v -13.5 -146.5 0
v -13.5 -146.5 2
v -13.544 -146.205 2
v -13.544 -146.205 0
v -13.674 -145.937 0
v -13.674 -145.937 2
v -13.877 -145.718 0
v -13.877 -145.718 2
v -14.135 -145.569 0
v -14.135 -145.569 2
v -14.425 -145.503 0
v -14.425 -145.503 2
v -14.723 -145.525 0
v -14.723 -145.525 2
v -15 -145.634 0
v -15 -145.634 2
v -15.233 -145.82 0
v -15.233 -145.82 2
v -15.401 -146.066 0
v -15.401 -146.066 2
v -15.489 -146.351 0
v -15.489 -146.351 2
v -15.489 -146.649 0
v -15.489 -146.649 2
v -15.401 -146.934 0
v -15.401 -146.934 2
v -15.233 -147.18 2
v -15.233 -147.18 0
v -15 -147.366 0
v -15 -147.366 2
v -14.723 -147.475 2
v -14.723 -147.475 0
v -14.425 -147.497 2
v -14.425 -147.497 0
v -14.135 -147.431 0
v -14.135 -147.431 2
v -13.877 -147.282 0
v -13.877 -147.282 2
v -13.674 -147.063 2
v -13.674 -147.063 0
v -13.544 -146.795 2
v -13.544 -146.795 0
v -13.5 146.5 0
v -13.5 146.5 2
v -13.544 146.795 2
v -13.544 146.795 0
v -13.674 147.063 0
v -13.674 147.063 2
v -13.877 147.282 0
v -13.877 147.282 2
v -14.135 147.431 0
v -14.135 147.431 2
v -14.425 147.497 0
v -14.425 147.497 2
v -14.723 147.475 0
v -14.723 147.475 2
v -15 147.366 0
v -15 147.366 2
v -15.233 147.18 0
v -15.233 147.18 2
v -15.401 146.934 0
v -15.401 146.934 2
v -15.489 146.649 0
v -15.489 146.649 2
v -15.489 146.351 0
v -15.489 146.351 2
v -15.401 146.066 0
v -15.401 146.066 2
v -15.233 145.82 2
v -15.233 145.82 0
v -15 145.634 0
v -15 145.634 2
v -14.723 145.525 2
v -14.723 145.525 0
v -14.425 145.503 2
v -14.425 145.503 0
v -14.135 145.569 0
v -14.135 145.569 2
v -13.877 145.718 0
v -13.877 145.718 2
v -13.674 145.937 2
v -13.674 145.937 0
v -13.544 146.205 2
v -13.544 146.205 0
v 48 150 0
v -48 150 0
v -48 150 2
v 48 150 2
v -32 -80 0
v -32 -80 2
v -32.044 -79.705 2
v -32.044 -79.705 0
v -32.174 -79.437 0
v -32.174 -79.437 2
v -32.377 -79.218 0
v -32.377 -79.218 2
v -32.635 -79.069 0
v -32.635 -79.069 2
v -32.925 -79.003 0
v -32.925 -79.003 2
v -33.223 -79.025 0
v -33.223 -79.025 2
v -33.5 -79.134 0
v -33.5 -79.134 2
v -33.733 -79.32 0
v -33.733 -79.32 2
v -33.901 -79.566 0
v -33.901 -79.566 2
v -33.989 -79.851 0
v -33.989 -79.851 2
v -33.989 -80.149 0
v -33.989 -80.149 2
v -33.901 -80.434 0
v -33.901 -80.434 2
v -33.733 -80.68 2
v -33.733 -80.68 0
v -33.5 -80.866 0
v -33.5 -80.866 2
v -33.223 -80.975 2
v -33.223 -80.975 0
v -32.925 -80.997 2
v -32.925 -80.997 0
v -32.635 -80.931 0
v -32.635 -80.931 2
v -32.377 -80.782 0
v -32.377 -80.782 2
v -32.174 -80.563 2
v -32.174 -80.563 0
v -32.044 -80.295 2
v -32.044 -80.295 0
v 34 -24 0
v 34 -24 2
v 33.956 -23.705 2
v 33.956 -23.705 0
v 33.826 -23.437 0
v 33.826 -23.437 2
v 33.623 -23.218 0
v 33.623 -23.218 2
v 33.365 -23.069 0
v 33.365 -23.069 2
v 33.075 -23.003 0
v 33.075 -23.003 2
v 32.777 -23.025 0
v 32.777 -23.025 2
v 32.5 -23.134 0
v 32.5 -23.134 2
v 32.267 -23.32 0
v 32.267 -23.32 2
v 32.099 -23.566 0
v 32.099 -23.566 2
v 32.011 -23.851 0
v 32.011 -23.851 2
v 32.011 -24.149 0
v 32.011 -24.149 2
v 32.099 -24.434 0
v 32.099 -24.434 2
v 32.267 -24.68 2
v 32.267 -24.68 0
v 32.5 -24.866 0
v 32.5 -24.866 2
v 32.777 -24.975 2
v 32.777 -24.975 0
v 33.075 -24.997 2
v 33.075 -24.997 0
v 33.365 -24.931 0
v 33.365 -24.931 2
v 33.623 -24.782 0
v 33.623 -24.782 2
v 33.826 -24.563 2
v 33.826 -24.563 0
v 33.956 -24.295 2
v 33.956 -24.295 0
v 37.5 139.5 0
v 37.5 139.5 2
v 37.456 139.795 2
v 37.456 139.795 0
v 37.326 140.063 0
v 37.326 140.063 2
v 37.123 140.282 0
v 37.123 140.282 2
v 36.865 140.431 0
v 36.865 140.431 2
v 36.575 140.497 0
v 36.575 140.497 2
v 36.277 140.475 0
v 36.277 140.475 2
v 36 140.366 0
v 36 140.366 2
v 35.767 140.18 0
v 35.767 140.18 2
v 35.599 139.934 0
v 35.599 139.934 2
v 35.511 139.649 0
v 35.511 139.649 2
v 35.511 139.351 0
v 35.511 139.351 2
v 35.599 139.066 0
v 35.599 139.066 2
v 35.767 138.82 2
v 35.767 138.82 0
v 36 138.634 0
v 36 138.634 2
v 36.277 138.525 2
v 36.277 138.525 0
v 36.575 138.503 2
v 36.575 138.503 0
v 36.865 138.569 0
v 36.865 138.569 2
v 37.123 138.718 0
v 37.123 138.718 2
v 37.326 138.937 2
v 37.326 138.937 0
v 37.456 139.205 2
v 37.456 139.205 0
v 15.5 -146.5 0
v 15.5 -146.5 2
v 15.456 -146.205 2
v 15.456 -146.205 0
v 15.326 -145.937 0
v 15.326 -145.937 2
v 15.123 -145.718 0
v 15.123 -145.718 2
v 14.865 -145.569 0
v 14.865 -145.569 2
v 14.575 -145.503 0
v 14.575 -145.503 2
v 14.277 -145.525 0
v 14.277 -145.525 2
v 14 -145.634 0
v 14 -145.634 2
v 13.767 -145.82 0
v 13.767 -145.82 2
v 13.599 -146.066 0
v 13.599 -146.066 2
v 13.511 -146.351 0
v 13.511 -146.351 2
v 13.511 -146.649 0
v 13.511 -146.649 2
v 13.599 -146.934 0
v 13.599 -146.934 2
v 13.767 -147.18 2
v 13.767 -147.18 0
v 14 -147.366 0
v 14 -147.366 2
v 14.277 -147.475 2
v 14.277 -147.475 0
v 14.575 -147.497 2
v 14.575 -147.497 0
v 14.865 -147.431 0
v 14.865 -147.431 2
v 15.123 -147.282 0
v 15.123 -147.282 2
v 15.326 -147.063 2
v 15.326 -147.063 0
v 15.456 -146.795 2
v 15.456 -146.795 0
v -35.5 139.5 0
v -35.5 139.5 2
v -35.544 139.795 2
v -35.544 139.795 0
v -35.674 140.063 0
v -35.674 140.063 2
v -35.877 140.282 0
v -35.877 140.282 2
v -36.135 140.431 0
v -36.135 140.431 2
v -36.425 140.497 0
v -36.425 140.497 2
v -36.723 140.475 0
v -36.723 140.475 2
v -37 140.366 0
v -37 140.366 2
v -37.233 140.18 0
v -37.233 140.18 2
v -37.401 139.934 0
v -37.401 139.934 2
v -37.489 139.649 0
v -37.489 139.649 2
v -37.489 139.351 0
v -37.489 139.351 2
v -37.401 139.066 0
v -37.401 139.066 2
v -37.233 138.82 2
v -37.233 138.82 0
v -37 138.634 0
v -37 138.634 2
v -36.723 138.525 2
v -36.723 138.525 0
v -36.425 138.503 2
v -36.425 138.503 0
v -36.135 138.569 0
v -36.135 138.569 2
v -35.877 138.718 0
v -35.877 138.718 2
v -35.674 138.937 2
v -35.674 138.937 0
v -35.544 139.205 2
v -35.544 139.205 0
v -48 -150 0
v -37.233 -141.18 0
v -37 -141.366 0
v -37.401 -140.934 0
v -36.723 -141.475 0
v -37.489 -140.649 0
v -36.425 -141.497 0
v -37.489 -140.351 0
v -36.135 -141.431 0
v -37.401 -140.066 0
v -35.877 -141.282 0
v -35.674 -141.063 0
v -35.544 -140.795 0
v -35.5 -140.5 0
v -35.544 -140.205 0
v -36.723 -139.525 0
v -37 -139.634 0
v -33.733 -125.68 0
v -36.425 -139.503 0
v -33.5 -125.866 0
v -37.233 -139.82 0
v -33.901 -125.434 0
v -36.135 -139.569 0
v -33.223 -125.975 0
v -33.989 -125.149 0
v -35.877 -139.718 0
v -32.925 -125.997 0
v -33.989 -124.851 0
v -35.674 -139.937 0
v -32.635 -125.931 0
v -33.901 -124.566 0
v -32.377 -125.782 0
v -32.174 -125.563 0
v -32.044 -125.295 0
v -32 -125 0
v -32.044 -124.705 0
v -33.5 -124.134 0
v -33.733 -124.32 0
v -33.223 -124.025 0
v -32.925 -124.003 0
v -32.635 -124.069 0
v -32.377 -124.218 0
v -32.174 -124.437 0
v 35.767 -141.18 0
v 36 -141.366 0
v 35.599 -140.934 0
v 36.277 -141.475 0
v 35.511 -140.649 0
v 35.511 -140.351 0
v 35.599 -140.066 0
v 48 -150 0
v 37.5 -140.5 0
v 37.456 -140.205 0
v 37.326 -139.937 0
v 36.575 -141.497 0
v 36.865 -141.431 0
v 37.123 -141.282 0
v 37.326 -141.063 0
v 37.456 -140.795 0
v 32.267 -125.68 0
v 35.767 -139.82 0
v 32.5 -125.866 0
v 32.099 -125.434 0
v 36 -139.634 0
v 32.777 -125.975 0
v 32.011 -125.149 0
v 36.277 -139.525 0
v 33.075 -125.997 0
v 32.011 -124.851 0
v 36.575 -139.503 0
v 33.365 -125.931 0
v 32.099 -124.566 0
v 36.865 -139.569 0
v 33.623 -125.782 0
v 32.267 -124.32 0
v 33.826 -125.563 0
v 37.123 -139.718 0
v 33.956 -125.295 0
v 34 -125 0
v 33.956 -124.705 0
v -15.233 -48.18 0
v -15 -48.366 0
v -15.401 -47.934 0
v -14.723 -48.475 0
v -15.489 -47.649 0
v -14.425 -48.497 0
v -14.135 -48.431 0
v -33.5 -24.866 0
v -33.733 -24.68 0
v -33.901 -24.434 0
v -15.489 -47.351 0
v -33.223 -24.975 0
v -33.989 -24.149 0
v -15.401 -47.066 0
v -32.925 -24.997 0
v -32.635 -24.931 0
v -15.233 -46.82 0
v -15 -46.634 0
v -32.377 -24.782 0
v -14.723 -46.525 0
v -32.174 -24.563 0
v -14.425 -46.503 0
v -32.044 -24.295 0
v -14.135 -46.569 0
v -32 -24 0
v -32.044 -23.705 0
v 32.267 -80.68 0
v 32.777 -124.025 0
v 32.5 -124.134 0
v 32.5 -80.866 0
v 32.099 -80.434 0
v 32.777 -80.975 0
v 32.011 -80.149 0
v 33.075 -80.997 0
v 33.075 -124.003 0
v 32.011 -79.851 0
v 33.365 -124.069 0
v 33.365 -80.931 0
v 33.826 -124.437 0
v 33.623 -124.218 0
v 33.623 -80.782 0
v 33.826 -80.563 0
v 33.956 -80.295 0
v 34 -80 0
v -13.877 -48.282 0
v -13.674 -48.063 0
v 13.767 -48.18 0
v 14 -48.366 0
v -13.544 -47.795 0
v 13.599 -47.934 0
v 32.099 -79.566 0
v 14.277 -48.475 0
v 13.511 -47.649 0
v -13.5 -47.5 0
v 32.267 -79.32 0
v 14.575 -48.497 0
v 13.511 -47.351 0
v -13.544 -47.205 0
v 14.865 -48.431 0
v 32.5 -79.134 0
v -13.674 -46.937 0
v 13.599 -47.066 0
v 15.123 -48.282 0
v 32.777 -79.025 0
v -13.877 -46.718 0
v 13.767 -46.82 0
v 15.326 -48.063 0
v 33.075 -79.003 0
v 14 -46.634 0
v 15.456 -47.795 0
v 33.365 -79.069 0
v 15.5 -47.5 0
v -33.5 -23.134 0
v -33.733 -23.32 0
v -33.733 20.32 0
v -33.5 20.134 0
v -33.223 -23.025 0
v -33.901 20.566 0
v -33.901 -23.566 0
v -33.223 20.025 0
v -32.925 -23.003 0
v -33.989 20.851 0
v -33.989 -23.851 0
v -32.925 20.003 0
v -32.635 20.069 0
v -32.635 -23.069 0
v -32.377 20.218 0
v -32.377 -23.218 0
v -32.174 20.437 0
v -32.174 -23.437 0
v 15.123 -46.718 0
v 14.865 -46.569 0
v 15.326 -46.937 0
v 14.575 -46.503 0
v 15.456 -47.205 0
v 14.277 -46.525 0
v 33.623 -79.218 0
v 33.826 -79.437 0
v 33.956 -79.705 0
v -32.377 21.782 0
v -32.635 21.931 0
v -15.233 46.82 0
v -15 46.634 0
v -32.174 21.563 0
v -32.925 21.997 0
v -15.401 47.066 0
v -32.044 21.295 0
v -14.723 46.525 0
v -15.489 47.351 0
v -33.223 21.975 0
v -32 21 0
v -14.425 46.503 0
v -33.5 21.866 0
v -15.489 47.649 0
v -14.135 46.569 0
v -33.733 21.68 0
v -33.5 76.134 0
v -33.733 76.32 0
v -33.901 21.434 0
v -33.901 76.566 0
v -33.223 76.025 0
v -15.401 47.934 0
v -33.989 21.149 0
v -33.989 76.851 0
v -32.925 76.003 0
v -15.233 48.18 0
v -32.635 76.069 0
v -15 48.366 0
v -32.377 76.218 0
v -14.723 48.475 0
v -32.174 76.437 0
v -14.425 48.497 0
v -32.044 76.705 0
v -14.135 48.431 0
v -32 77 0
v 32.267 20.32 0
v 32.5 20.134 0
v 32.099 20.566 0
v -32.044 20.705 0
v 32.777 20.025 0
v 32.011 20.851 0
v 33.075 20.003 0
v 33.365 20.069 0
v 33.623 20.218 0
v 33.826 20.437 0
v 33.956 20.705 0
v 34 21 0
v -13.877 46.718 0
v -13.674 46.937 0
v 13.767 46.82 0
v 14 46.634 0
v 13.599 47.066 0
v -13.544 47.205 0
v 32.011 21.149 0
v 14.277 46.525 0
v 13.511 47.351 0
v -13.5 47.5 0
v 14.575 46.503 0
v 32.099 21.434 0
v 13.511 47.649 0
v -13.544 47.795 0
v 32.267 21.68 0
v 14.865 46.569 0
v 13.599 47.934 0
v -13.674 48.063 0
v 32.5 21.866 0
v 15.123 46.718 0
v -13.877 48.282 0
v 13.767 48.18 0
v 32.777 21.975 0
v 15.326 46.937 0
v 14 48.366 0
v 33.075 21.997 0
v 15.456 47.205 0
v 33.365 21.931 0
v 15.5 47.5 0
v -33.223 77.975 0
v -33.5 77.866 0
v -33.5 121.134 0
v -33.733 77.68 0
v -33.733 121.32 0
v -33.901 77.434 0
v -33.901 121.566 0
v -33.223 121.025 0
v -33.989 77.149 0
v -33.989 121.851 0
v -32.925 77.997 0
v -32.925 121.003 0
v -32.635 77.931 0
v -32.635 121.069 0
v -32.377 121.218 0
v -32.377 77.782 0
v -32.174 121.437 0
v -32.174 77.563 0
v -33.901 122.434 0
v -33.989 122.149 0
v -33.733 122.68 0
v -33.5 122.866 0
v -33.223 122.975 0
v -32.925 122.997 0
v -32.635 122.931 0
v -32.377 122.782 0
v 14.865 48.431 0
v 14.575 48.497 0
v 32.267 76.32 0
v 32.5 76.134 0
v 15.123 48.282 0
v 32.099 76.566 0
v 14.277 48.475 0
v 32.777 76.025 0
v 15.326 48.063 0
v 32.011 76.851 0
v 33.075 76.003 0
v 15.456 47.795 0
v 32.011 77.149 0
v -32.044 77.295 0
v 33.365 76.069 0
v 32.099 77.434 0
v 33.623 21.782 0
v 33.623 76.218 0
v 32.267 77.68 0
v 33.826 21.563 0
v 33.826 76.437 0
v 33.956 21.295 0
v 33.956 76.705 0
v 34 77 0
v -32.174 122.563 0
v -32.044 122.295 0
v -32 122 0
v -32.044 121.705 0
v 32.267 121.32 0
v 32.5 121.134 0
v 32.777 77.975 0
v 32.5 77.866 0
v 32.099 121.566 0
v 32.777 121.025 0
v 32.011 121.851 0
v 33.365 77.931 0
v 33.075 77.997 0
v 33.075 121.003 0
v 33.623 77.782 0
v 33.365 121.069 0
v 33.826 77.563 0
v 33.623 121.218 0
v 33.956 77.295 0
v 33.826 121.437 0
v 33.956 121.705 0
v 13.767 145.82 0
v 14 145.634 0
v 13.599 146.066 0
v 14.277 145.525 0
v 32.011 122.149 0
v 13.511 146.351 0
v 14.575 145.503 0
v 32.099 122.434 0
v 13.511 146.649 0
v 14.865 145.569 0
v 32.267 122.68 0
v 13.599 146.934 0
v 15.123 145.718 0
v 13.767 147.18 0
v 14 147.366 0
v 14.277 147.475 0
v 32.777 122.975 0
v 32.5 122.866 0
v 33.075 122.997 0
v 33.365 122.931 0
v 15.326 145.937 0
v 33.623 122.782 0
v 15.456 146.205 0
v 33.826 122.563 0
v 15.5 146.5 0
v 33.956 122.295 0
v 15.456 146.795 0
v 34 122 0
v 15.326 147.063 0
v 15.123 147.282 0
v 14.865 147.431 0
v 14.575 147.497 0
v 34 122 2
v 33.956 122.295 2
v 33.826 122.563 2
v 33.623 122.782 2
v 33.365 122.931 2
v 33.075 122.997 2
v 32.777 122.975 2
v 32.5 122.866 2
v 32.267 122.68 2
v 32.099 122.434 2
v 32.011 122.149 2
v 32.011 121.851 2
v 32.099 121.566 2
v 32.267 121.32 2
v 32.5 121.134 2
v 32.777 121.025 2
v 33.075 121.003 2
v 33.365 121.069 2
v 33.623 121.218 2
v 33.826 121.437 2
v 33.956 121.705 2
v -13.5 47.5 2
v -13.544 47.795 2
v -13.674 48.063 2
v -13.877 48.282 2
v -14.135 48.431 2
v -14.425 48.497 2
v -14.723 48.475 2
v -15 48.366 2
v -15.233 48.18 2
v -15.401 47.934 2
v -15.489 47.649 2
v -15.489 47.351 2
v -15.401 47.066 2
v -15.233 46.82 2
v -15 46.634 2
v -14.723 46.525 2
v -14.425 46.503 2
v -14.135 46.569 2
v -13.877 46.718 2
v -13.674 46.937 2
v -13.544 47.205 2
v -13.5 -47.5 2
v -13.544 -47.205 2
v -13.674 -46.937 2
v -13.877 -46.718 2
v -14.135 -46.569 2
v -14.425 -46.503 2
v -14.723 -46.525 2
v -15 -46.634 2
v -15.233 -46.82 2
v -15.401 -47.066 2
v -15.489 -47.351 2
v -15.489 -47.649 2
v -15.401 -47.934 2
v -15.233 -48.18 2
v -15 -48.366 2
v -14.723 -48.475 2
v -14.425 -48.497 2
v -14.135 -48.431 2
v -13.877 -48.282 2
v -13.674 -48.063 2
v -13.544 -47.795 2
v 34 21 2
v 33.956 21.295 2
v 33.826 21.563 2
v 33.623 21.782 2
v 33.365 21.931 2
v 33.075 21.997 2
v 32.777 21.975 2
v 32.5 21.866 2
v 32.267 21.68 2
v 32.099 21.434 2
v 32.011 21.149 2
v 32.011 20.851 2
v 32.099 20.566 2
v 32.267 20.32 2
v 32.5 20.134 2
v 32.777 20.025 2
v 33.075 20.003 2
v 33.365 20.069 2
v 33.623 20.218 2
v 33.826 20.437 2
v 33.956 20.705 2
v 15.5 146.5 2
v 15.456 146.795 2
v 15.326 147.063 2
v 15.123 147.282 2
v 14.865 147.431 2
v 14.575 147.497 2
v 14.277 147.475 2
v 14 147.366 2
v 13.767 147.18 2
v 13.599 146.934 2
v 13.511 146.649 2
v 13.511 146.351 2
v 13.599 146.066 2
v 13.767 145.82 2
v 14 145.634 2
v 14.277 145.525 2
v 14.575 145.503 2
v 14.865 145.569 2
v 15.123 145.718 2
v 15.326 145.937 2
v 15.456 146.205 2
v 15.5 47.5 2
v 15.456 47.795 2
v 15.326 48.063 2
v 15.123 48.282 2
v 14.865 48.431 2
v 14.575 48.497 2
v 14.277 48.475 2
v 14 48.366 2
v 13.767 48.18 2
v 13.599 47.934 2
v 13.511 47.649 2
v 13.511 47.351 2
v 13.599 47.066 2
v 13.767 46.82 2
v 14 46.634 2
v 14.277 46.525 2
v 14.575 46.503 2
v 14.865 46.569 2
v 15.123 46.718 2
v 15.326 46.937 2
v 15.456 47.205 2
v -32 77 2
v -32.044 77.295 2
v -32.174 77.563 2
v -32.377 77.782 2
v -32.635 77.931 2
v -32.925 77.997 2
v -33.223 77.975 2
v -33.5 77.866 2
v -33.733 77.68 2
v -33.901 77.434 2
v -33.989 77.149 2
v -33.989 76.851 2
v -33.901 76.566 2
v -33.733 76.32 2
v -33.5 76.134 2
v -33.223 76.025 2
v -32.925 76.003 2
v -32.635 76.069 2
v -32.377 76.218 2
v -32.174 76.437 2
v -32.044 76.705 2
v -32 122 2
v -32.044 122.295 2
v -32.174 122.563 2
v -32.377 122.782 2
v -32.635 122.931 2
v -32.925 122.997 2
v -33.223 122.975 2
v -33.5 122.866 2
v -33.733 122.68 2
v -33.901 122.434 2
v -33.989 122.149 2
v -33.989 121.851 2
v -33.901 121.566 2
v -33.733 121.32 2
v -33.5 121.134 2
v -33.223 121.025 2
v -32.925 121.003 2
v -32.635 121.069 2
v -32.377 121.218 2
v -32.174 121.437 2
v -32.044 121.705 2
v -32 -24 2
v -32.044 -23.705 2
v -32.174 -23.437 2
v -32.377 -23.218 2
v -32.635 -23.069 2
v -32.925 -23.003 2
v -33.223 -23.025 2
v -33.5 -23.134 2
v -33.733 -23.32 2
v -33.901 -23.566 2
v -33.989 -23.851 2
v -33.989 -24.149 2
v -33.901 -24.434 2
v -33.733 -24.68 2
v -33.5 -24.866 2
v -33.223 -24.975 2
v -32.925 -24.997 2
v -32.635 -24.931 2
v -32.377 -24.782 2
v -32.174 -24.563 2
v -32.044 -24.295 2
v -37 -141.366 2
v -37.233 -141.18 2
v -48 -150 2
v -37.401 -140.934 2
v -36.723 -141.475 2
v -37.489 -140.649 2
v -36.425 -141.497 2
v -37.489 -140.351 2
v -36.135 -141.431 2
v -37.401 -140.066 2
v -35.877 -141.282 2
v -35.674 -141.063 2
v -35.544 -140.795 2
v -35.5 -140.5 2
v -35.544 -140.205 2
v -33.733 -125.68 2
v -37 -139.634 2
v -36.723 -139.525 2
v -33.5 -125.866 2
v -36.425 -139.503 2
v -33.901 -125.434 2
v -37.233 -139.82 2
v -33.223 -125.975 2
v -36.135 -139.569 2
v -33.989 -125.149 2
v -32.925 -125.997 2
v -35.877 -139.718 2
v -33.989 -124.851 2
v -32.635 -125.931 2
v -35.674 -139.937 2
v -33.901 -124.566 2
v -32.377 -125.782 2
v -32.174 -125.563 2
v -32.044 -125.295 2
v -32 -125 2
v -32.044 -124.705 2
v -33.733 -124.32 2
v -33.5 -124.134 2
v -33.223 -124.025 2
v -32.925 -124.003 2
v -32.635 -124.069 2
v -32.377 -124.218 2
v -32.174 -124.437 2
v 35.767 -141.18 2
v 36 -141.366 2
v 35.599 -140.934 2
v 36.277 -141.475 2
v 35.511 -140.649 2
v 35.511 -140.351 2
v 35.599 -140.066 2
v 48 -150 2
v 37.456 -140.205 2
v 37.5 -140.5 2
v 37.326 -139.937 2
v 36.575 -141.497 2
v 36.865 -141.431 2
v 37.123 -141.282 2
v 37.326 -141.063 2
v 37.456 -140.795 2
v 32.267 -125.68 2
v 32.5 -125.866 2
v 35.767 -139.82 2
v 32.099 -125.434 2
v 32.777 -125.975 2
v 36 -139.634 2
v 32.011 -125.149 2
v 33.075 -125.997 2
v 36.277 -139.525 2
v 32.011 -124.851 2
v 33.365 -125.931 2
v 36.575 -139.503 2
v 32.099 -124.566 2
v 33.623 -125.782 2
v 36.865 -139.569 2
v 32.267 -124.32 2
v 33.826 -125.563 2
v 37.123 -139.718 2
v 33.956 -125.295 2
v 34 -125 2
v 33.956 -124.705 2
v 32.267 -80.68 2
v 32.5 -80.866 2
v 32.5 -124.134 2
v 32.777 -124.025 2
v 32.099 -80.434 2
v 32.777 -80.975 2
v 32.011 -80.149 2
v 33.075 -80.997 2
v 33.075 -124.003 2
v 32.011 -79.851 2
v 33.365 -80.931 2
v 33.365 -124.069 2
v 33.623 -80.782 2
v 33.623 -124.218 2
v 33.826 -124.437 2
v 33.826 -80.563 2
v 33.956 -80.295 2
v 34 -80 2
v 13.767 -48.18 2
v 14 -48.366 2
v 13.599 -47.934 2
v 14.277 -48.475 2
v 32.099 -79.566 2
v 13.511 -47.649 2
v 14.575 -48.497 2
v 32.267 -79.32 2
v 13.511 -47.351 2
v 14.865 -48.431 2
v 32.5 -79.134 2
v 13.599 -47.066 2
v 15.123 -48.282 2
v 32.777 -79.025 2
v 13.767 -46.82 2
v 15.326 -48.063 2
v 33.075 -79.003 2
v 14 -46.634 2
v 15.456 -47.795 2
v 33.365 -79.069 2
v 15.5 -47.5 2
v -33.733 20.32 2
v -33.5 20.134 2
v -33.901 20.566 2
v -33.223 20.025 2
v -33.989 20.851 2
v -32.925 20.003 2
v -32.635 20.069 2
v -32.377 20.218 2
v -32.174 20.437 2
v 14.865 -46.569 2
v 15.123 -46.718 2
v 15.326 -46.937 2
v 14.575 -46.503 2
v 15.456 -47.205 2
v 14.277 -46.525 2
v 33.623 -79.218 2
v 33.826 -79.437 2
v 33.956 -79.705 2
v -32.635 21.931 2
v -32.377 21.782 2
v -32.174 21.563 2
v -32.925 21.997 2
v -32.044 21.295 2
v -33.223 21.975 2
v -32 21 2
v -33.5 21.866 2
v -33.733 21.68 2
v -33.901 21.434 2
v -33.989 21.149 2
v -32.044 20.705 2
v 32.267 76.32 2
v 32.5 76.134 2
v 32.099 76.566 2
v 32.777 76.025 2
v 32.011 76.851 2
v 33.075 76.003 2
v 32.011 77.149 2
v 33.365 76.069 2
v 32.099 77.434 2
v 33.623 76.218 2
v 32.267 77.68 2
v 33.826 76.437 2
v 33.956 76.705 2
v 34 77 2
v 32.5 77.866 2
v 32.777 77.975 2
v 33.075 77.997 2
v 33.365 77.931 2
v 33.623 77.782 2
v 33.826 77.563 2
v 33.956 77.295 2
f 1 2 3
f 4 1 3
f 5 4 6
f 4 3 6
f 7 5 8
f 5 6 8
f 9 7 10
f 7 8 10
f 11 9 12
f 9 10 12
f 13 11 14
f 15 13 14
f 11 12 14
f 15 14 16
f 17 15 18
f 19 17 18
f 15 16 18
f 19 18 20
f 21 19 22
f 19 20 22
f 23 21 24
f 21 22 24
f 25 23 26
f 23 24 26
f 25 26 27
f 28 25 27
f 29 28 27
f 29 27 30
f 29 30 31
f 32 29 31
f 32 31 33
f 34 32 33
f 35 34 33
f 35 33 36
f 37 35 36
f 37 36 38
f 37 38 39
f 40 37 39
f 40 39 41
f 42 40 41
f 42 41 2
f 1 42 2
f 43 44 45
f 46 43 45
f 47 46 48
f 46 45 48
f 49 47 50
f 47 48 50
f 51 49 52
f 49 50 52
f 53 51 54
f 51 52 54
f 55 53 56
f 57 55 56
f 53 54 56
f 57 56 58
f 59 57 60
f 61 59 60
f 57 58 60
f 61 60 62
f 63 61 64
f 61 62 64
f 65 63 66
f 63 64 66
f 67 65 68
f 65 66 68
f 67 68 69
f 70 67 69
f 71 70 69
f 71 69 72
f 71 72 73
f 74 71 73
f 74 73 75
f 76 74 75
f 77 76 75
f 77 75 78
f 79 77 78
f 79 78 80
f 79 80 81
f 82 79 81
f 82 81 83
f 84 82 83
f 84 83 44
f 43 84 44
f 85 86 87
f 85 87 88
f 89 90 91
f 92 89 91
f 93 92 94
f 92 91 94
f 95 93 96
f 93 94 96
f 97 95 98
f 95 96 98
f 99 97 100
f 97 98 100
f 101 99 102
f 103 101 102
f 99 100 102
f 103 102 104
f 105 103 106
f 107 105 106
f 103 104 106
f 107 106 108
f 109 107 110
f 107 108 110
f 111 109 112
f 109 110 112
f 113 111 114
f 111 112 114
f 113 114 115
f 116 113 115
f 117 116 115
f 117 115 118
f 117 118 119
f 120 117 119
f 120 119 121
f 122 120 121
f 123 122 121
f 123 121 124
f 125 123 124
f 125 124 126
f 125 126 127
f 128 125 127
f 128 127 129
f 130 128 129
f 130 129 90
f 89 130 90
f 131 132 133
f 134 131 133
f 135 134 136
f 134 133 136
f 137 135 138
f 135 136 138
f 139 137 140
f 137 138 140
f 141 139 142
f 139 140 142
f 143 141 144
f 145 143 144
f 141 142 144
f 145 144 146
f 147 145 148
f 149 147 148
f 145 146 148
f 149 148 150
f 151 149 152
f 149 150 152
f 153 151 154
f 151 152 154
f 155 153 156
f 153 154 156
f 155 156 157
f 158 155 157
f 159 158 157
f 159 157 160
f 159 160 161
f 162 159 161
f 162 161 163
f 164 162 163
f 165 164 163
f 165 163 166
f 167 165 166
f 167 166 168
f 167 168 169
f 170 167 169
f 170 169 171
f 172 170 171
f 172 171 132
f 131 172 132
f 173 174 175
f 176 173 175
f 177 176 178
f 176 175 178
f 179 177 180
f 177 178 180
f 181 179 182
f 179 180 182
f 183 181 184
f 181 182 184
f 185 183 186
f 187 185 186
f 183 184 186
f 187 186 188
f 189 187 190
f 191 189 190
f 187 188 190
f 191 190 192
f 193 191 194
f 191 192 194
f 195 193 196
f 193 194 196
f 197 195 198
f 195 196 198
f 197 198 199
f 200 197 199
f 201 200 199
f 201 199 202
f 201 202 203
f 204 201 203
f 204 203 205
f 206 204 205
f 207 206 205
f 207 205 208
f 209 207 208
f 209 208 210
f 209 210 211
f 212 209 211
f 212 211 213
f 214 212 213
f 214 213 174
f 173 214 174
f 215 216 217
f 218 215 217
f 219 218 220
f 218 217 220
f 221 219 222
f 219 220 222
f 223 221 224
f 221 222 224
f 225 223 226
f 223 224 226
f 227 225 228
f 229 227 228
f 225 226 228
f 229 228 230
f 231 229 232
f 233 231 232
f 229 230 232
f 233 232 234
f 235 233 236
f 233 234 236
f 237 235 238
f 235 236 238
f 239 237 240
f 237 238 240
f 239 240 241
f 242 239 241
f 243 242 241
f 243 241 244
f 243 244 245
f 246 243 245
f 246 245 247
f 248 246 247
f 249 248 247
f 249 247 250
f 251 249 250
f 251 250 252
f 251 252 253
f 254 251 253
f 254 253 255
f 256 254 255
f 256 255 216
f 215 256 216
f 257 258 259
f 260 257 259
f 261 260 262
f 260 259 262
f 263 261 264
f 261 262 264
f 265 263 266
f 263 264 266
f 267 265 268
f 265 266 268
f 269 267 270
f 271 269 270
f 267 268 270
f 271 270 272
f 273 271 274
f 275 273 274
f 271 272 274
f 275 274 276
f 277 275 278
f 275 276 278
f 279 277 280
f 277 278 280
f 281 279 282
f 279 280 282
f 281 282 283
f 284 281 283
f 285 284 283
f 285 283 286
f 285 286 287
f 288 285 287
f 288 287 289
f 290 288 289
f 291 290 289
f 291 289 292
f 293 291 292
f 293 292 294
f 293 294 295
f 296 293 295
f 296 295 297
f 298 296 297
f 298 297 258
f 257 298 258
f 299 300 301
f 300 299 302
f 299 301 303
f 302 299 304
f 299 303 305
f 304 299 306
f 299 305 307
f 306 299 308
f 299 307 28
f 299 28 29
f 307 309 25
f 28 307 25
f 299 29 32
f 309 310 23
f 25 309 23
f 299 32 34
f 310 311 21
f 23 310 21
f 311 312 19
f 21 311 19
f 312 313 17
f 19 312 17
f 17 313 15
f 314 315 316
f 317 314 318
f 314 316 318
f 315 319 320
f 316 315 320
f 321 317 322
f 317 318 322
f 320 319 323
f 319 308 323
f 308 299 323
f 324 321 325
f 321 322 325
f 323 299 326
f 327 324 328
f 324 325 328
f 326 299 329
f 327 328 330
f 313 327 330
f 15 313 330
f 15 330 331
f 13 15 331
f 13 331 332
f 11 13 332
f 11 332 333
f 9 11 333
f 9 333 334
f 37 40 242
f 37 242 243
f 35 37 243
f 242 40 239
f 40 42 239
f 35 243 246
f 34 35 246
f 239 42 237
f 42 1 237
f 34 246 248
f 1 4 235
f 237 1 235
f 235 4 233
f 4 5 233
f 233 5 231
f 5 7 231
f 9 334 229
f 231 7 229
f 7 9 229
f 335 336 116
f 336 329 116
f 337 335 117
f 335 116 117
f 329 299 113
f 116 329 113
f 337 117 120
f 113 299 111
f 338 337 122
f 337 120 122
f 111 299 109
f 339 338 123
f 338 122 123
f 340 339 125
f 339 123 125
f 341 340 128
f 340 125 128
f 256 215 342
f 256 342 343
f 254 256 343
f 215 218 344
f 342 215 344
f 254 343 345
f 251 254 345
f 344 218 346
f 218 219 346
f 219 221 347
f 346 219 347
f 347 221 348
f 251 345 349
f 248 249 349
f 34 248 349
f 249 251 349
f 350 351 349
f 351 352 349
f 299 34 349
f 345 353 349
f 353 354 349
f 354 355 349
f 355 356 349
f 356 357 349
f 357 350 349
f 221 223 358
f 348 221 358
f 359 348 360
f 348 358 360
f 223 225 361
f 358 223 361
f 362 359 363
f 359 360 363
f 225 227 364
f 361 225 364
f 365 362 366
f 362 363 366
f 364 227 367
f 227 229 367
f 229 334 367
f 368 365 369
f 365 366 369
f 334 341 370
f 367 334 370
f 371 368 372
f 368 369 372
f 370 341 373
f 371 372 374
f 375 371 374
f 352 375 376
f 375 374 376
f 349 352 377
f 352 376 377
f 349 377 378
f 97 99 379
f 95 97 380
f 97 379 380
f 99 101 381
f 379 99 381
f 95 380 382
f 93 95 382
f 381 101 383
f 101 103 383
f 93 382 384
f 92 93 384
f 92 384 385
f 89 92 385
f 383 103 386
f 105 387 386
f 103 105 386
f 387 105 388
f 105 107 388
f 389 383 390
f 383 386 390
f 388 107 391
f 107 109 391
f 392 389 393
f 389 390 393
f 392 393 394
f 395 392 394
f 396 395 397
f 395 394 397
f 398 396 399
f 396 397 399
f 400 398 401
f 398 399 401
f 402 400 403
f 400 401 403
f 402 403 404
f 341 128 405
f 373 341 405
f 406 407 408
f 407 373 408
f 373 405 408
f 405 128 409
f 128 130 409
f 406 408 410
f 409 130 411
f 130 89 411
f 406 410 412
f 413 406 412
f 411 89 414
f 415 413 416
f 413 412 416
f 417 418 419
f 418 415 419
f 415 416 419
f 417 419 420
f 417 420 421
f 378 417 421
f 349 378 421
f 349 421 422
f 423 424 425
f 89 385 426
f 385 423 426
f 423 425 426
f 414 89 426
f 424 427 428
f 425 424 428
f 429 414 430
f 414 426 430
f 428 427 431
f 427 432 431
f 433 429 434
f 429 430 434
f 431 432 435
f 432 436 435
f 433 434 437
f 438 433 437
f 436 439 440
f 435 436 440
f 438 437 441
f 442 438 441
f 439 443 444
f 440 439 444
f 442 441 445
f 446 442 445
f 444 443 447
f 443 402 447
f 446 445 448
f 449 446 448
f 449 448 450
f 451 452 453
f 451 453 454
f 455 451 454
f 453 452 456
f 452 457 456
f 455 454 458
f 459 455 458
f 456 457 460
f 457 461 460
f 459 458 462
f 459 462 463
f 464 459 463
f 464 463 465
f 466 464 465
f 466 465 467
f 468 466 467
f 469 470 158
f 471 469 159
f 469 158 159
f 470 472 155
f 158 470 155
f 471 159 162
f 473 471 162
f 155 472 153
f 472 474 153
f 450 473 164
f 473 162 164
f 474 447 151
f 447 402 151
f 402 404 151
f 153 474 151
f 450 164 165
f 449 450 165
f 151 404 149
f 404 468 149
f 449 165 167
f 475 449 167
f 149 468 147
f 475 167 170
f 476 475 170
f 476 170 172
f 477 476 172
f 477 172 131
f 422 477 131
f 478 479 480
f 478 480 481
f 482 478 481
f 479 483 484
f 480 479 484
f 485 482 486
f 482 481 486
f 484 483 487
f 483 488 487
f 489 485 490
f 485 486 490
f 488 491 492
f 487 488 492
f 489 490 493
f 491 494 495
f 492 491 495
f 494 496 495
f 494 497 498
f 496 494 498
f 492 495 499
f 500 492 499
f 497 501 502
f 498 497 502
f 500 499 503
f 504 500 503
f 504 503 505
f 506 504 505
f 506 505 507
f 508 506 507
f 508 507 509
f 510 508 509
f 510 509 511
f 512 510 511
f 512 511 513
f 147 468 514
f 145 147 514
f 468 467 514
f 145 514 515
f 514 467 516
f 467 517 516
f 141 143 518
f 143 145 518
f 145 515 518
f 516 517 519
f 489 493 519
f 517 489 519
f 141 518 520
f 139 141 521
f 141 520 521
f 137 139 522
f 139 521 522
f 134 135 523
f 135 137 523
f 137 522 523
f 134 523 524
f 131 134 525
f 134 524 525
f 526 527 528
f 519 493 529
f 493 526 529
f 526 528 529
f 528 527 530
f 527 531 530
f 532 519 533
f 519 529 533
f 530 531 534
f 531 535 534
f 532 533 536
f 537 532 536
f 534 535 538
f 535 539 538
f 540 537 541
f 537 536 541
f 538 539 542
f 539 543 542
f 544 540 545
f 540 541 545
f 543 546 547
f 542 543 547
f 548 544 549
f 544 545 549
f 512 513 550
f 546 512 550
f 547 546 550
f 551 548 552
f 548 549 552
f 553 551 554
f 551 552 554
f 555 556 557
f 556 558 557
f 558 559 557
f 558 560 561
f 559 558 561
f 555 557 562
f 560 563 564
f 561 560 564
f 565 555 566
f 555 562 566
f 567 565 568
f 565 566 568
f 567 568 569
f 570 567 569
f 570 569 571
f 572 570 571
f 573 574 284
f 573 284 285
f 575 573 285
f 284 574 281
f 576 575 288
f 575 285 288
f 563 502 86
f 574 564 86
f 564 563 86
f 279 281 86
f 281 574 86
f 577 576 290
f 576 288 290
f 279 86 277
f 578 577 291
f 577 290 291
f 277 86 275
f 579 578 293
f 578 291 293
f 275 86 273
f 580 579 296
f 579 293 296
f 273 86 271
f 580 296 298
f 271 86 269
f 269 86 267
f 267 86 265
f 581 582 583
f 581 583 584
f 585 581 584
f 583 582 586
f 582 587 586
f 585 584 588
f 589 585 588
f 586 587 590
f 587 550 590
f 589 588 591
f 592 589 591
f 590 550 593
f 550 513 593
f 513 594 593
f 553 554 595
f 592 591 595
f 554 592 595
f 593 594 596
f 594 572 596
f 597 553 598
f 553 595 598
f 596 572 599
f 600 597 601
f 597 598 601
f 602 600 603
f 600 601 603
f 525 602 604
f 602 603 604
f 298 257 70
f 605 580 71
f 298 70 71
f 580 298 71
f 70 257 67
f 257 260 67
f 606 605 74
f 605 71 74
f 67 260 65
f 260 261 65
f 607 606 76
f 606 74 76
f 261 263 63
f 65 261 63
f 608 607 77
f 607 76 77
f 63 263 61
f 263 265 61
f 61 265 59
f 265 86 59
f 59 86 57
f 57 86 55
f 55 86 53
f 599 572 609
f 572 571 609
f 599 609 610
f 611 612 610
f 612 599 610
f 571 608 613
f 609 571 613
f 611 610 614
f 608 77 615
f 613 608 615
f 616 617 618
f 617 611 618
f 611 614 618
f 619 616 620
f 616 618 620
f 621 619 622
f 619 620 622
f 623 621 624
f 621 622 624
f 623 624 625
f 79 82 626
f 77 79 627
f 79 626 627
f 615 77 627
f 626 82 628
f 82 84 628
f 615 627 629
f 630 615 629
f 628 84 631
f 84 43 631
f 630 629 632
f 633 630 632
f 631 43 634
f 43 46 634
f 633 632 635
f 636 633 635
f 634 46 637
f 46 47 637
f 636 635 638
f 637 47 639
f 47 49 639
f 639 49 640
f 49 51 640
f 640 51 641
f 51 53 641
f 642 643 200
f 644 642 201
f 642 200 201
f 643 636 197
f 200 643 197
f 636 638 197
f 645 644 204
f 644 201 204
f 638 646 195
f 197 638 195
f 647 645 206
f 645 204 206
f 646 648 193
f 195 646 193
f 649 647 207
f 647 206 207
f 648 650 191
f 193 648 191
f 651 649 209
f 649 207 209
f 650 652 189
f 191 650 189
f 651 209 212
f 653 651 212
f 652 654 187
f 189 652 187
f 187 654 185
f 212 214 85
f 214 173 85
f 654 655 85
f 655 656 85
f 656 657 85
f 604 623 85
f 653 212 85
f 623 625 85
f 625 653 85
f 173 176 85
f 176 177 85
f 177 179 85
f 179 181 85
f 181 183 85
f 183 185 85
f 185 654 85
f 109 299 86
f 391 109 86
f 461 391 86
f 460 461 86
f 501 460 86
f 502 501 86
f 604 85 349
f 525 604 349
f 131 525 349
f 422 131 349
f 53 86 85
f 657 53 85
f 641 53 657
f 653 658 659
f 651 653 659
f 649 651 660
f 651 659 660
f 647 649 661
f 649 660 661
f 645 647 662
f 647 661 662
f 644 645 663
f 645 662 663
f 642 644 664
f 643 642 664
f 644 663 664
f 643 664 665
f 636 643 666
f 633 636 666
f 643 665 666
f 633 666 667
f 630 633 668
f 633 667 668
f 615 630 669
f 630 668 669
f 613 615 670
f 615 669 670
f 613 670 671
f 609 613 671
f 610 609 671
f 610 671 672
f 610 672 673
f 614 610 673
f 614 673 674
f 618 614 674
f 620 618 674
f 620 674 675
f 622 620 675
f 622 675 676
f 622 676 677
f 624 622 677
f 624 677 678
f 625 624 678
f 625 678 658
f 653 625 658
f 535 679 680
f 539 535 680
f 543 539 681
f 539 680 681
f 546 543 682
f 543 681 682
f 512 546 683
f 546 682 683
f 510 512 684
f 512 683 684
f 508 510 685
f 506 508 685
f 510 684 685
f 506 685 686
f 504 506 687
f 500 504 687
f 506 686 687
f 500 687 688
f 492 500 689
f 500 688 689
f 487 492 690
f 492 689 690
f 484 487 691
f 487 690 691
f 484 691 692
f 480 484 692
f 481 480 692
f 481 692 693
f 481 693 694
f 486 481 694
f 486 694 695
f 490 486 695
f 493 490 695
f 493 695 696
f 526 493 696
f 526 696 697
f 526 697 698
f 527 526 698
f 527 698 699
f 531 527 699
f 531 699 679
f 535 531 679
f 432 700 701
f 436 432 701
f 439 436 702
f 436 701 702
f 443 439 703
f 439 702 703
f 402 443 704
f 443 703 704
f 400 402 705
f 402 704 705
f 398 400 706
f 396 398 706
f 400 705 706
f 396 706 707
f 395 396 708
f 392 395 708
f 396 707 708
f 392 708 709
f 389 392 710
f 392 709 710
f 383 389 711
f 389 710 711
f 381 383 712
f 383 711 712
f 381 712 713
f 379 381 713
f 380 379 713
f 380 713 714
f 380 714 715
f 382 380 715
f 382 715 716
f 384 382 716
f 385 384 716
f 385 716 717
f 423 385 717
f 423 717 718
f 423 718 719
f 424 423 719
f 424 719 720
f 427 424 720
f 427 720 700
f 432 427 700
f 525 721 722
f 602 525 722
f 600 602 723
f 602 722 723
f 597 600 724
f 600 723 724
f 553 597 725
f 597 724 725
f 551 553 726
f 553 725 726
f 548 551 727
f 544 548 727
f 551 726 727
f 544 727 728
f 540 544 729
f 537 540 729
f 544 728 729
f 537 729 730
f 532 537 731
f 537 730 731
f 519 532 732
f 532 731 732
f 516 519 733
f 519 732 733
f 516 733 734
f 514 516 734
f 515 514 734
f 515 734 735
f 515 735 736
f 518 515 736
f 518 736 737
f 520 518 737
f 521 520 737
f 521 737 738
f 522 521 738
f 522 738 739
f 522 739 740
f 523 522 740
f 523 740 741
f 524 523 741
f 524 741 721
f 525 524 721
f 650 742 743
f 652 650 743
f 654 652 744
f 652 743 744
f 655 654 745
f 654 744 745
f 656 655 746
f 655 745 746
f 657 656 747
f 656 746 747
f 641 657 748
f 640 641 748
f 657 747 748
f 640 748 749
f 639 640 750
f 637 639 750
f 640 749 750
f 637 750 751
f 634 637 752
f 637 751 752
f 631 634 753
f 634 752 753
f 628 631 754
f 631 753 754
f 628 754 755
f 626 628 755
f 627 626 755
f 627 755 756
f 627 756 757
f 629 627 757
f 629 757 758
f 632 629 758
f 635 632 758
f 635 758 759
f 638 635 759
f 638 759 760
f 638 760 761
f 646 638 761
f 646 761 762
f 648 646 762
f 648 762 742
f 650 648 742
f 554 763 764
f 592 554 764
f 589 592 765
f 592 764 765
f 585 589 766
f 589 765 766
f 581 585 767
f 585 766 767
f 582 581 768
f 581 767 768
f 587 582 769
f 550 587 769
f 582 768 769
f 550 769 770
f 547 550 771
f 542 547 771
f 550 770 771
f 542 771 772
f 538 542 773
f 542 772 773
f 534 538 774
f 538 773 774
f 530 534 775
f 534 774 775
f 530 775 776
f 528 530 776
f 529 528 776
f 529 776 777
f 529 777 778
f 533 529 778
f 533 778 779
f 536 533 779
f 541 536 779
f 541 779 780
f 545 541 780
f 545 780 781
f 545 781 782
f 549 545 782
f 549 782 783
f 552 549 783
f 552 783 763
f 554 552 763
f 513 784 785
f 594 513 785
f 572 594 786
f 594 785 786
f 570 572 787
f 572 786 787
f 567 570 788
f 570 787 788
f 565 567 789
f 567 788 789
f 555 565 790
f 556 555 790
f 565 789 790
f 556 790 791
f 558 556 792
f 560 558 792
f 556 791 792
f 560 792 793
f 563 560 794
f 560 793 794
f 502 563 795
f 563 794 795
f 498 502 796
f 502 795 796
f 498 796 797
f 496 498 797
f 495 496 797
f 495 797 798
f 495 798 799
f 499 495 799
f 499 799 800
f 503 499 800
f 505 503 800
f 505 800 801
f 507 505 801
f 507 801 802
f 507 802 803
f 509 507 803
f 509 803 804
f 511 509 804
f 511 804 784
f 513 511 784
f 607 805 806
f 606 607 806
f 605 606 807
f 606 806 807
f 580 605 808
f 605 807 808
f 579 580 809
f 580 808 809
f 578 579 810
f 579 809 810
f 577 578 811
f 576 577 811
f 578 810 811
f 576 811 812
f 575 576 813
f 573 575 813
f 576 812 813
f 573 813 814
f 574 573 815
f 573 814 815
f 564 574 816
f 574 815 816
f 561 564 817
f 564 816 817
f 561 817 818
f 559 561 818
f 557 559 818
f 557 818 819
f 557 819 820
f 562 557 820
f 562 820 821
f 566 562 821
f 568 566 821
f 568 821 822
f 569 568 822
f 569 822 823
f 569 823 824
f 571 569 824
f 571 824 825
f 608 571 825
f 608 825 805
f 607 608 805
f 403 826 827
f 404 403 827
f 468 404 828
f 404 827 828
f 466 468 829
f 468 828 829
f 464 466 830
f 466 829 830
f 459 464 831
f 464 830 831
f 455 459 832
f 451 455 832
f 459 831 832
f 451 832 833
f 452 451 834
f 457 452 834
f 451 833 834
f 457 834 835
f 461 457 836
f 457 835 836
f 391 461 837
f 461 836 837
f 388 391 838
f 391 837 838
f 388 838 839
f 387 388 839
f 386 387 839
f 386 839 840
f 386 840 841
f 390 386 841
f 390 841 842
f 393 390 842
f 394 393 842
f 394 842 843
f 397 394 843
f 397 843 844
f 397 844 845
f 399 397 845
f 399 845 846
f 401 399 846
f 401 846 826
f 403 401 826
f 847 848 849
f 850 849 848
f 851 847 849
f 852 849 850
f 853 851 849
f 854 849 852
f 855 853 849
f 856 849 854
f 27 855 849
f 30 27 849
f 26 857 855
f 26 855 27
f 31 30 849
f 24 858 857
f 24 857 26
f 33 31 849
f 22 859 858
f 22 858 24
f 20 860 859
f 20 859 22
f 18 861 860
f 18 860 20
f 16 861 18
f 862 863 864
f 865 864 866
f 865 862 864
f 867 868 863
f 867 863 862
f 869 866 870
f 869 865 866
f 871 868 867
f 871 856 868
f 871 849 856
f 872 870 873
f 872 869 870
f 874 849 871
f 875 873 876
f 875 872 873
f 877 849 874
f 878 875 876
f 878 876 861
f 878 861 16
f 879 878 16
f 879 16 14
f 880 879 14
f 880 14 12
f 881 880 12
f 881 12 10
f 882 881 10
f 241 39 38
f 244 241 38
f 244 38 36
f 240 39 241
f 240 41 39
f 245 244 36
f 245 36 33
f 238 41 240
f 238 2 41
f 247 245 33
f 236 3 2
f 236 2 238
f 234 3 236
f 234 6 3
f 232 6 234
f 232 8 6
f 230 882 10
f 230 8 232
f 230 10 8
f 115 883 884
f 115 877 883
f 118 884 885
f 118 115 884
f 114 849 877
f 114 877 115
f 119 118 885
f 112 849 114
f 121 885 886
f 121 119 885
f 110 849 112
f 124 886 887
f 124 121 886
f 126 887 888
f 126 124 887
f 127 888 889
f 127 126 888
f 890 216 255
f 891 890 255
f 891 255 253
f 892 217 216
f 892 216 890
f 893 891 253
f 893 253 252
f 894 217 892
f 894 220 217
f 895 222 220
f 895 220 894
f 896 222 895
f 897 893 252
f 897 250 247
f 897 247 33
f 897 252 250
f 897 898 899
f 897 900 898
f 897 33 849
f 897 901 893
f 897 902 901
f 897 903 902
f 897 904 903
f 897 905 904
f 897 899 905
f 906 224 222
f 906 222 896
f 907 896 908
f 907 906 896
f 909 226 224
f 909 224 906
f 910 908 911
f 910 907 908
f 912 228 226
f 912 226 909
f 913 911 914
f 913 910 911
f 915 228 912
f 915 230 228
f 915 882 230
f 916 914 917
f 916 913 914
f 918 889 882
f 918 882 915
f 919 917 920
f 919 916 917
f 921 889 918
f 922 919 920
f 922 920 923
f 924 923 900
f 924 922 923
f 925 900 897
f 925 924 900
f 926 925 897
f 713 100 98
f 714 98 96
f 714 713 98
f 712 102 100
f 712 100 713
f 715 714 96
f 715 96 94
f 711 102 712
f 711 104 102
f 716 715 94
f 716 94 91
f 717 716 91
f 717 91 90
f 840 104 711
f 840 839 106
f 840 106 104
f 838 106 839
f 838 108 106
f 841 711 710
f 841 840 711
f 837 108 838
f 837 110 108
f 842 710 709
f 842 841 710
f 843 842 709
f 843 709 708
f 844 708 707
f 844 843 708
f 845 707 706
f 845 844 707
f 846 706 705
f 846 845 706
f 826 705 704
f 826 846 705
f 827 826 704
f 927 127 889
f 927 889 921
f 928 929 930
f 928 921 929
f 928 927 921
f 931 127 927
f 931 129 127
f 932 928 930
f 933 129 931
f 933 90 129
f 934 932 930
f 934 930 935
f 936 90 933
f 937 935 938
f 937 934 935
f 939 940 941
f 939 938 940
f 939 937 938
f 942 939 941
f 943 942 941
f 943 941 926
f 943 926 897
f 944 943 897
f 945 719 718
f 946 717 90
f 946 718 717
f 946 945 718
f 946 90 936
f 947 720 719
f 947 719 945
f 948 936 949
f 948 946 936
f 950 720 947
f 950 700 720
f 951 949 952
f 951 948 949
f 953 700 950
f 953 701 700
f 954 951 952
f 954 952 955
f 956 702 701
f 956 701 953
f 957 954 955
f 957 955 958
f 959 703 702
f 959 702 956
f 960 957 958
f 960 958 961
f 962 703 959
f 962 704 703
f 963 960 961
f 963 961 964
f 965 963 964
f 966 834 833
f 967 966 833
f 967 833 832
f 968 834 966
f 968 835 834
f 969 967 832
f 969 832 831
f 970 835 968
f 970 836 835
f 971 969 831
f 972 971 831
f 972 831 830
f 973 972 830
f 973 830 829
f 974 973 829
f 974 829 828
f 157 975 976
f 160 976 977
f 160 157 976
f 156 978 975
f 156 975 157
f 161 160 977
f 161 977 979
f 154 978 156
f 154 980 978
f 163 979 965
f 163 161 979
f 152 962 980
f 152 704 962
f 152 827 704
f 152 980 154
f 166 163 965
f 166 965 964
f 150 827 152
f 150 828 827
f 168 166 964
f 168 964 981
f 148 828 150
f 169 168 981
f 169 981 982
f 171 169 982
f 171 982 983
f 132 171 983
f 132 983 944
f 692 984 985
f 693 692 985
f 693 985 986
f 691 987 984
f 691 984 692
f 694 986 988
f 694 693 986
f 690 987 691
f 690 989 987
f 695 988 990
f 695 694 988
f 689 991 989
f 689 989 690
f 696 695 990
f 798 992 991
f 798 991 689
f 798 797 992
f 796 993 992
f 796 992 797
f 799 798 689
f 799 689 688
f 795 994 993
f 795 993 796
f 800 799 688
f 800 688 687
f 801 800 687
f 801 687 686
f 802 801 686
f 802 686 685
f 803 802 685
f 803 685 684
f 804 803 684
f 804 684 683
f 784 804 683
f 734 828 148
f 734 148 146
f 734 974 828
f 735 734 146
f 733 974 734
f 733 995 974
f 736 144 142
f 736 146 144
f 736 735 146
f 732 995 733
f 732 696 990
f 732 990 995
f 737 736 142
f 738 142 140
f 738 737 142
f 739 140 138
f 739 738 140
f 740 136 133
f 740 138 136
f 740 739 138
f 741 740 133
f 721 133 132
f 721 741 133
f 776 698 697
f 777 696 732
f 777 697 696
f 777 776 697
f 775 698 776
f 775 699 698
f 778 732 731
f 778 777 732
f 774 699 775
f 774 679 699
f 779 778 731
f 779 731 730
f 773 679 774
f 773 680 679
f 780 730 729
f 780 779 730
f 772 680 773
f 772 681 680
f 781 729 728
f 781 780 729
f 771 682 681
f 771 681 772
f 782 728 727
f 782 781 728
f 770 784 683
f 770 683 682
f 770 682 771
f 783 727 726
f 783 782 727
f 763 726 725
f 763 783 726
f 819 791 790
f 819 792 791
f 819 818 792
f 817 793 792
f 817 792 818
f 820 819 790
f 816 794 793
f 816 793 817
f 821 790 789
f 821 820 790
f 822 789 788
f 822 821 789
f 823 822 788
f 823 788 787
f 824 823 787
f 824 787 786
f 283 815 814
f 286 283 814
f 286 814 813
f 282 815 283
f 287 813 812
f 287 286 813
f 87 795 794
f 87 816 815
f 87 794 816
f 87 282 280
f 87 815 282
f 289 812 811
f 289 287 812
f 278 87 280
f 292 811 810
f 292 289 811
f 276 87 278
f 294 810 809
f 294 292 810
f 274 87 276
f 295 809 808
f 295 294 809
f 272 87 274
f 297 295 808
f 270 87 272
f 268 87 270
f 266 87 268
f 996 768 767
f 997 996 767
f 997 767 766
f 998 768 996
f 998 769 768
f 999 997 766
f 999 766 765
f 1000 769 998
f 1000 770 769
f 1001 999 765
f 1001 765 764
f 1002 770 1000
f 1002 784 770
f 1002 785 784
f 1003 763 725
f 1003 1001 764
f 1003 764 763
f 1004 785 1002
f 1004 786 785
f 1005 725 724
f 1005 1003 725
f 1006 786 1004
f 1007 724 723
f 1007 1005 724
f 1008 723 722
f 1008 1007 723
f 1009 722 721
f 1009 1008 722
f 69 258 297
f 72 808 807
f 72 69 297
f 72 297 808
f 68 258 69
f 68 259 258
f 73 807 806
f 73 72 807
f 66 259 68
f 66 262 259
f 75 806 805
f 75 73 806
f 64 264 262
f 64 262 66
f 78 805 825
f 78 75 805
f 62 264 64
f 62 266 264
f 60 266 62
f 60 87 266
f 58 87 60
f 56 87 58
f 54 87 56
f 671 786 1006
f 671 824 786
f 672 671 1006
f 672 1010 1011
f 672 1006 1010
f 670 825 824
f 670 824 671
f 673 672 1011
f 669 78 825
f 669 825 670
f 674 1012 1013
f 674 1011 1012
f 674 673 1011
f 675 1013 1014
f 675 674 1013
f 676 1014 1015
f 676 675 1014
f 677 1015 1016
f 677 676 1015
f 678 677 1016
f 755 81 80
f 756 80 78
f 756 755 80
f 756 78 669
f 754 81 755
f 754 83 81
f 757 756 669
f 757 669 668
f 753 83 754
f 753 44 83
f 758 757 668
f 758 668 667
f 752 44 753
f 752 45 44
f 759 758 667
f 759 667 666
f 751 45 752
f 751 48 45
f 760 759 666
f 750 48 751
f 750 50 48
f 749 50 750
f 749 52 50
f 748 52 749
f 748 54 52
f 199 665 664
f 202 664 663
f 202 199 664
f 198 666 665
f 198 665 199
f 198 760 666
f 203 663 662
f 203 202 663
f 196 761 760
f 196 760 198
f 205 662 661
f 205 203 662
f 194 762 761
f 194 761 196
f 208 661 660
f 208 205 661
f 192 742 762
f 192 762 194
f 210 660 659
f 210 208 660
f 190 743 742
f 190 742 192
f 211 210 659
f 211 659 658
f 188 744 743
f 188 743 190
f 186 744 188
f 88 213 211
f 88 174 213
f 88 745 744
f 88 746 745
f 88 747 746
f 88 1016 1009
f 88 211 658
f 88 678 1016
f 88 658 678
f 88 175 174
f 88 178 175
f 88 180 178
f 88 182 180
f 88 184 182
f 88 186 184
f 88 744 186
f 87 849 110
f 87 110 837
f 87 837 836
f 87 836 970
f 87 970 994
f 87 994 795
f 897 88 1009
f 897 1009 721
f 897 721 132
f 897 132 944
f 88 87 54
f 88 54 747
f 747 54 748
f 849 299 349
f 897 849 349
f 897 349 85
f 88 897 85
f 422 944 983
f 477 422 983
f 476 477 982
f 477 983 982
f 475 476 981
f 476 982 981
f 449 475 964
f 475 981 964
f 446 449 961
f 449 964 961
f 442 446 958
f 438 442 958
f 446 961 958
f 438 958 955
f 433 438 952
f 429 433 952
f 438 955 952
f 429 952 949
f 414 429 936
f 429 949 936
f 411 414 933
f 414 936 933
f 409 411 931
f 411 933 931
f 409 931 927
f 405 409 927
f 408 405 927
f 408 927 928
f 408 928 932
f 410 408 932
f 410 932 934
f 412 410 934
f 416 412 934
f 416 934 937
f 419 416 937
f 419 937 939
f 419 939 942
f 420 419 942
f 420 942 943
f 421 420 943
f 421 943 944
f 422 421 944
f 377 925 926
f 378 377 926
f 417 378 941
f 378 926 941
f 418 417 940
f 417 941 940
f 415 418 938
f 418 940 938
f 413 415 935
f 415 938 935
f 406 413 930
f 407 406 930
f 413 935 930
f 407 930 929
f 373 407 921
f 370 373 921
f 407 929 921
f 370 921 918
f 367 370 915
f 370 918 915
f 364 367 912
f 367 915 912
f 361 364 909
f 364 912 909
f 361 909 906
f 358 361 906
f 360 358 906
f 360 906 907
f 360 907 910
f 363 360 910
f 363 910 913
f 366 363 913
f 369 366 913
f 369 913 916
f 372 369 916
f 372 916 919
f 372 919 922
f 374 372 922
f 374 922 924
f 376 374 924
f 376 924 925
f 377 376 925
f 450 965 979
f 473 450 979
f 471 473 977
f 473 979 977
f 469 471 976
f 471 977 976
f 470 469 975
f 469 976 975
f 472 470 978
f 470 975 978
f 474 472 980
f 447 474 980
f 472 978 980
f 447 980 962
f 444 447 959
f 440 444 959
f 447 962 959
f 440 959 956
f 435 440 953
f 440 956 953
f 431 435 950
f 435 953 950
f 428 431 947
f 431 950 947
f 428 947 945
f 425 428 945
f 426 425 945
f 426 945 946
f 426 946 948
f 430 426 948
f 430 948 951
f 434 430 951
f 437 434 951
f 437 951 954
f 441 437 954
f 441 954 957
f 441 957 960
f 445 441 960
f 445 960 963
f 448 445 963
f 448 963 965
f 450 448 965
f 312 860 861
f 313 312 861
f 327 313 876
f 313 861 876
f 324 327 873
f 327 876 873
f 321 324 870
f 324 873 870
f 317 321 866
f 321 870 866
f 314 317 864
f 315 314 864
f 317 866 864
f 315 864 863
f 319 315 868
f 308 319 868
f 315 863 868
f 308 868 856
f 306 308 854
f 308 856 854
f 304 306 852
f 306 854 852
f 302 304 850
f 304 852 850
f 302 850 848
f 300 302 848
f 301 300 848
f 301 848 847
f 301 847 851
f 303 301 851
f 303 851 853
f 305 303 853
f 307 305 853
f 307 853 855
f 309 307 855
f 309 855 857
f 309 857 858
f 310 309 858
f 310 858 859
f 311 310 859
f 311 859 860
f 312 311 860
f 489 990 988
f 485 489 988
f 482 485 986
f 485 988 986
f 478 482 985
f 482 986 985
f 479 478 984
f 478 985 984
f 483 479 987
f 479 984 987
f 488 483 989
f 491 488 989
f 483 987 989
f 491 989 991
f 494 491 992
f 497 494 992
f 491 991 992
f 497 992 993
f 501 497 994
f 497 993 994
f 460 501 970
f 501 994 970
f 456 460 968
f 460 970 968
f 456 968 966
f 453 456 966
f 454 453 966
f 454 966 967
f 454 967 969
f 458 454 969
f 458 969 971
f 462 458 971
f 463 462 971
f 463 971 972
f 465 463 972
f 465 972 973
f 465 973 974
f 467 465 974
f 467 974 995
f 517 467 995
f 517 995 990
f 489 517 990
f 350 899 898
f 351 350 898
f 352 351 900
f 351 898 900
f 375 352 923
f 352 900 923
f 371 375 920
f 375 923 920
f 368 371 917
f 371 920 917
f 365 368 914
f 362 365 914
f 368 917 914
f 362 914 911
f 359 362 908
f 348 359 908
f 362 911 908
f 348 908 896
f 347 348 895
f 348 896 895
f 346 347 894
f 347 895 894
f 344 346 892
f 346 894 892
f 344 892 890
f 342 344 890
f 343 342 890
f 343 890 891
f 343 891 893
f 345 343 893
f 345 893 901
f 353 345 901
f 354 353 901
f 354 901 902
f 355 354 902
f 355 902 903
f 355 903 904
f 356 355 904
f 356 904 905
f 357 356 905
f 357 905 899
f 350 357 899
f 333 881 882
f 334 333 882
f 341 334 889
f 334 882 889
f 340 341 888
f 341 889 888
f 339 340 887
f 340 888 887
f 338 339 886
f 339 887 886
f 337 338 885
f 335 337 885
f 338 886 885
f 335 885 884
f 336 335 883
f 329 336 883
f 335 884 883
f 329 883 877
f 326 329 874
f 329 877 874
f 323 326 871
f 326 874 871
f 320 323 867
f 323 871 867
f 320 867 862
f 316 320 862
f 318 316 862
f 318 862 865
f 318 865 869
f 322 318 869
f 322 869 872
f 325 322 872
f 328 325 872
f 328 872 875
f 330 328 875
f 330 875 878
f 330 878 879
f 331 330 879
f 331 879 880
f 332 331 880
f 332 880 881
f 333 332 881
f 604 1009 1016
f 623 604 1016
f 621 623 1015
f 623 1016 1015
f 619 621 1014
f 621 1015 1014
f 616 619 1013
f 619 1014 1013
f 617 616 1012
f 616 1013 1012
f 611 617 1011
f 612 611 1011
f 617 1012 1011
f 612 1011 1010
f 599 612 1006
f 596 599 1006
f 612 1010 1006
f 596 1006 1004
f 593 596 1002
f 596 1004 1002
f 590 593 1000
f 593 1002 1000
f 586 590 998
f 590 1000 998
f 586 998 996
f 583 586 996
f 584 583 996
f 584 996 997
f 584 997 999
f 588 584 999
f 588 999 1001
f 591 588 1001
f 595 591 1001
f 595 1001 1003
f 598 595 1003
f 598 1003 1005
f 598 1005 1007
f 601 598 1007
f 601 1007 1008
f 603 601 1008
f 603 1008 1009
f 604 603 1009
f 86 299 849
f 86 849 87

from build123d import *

# Parameters (mm, degrees)
SKETCH1_W           = 96
SKETCH1_H           = 300
BOSS_EXTRUDE1_DEPTH = 2
SKETCH2_R           = 1
CUT_EXTRUDE1_DEPTH  = 10
SKETCH3_R           = 1
CUT_EXTRUDE2_DEPTH  = 10


with BuildPart() as part:
    # Sketch1 → Boss-Extrude1 (new body)
    with BuildSketch(Plane.XY):
        Rectangle(SKETCH1_W, SKETCH1_H)
    extrude(amount=BOSS_EXTRUDE1_DEPTH)

    # Sketch2 → Cut-Extrude1 (cut)
    with BuildSketch(Plane.XY.offset(2)):
        with Locations((-33, 122)):
            Circle(SKETCH2_R)
        with Locations((-33, 77)):
            Circle(SKETCH2_R)
        with Locations((-33, -125)):
            Circle(SKETCH2_R)
        with Locations((14.5, -146.5)):
            Circle(SKETCH2_R)
        with Locations((-14.5, -146.5)):
            Circle(SKETCH2_R)
        with Locations((-14.5, -47.5)):
            Circle(SKETCH2_R)
        with Locations((-14.5, 47.5)):
            Circle(SKETCH2_R)
        with Locations((-14.5, 146.5)):
            Circle(SKETCH2_R)
        with Locations((14.5, 146.5)):
            Circle(SKETCH2_R)
        with Locations((-33, -80)):
            Circle(SKETCH2_R)
        with Locations((-33, -24)):
            Circle(SKETCH2_R)
        with Locations((-33, 21)):
            Circle(SKETCH2_R)
        with Locations((33, 21)):
            Circle(SKETCH2_R)
        with Locations((33, -24)):
            Circle(SKETCH2_R)
        with Locations((33, -80)):
            Circle(SKETCH2_R)
        with Locations((33, -125)):
            Circle(SKETCH2_R)
        with Locations((33, 77)):
            Circle(SKETCH2_R)
        with Locations((33, 122)):
            Circle(SKETCH2_R)
        with Locations((14.5, -47.5)):
            Circle(SKETCH2_R)
        with Locations((14.5, 47.5)):
            Circle(SKETCH2_R)
    extrude(amount=-CUT_EXTRUDE1_DEPTH, mode=Mode.SUBTRACT)

    # Sketch3 → Cut-Extrude2 (cut)
    with BuildSketch(Plane.XY.offset(2)):
        with Locations((-36.5, 139.5)):
            Circle(SKETCH3_R)
        with Locations((36.5, 139.5)):
            Circle(SKETCH3_R)
        with Locations((-36.5, -140.5)):
            Circle(SKETCH3_R)
        with Locations((36.5, -140.5)):
            Circle(SKETCH3_R)
    extrude(amount=-CUT_EXTRUDE2_DEPTH, mode=Mode.SUBTRACT)


solid = part.part
